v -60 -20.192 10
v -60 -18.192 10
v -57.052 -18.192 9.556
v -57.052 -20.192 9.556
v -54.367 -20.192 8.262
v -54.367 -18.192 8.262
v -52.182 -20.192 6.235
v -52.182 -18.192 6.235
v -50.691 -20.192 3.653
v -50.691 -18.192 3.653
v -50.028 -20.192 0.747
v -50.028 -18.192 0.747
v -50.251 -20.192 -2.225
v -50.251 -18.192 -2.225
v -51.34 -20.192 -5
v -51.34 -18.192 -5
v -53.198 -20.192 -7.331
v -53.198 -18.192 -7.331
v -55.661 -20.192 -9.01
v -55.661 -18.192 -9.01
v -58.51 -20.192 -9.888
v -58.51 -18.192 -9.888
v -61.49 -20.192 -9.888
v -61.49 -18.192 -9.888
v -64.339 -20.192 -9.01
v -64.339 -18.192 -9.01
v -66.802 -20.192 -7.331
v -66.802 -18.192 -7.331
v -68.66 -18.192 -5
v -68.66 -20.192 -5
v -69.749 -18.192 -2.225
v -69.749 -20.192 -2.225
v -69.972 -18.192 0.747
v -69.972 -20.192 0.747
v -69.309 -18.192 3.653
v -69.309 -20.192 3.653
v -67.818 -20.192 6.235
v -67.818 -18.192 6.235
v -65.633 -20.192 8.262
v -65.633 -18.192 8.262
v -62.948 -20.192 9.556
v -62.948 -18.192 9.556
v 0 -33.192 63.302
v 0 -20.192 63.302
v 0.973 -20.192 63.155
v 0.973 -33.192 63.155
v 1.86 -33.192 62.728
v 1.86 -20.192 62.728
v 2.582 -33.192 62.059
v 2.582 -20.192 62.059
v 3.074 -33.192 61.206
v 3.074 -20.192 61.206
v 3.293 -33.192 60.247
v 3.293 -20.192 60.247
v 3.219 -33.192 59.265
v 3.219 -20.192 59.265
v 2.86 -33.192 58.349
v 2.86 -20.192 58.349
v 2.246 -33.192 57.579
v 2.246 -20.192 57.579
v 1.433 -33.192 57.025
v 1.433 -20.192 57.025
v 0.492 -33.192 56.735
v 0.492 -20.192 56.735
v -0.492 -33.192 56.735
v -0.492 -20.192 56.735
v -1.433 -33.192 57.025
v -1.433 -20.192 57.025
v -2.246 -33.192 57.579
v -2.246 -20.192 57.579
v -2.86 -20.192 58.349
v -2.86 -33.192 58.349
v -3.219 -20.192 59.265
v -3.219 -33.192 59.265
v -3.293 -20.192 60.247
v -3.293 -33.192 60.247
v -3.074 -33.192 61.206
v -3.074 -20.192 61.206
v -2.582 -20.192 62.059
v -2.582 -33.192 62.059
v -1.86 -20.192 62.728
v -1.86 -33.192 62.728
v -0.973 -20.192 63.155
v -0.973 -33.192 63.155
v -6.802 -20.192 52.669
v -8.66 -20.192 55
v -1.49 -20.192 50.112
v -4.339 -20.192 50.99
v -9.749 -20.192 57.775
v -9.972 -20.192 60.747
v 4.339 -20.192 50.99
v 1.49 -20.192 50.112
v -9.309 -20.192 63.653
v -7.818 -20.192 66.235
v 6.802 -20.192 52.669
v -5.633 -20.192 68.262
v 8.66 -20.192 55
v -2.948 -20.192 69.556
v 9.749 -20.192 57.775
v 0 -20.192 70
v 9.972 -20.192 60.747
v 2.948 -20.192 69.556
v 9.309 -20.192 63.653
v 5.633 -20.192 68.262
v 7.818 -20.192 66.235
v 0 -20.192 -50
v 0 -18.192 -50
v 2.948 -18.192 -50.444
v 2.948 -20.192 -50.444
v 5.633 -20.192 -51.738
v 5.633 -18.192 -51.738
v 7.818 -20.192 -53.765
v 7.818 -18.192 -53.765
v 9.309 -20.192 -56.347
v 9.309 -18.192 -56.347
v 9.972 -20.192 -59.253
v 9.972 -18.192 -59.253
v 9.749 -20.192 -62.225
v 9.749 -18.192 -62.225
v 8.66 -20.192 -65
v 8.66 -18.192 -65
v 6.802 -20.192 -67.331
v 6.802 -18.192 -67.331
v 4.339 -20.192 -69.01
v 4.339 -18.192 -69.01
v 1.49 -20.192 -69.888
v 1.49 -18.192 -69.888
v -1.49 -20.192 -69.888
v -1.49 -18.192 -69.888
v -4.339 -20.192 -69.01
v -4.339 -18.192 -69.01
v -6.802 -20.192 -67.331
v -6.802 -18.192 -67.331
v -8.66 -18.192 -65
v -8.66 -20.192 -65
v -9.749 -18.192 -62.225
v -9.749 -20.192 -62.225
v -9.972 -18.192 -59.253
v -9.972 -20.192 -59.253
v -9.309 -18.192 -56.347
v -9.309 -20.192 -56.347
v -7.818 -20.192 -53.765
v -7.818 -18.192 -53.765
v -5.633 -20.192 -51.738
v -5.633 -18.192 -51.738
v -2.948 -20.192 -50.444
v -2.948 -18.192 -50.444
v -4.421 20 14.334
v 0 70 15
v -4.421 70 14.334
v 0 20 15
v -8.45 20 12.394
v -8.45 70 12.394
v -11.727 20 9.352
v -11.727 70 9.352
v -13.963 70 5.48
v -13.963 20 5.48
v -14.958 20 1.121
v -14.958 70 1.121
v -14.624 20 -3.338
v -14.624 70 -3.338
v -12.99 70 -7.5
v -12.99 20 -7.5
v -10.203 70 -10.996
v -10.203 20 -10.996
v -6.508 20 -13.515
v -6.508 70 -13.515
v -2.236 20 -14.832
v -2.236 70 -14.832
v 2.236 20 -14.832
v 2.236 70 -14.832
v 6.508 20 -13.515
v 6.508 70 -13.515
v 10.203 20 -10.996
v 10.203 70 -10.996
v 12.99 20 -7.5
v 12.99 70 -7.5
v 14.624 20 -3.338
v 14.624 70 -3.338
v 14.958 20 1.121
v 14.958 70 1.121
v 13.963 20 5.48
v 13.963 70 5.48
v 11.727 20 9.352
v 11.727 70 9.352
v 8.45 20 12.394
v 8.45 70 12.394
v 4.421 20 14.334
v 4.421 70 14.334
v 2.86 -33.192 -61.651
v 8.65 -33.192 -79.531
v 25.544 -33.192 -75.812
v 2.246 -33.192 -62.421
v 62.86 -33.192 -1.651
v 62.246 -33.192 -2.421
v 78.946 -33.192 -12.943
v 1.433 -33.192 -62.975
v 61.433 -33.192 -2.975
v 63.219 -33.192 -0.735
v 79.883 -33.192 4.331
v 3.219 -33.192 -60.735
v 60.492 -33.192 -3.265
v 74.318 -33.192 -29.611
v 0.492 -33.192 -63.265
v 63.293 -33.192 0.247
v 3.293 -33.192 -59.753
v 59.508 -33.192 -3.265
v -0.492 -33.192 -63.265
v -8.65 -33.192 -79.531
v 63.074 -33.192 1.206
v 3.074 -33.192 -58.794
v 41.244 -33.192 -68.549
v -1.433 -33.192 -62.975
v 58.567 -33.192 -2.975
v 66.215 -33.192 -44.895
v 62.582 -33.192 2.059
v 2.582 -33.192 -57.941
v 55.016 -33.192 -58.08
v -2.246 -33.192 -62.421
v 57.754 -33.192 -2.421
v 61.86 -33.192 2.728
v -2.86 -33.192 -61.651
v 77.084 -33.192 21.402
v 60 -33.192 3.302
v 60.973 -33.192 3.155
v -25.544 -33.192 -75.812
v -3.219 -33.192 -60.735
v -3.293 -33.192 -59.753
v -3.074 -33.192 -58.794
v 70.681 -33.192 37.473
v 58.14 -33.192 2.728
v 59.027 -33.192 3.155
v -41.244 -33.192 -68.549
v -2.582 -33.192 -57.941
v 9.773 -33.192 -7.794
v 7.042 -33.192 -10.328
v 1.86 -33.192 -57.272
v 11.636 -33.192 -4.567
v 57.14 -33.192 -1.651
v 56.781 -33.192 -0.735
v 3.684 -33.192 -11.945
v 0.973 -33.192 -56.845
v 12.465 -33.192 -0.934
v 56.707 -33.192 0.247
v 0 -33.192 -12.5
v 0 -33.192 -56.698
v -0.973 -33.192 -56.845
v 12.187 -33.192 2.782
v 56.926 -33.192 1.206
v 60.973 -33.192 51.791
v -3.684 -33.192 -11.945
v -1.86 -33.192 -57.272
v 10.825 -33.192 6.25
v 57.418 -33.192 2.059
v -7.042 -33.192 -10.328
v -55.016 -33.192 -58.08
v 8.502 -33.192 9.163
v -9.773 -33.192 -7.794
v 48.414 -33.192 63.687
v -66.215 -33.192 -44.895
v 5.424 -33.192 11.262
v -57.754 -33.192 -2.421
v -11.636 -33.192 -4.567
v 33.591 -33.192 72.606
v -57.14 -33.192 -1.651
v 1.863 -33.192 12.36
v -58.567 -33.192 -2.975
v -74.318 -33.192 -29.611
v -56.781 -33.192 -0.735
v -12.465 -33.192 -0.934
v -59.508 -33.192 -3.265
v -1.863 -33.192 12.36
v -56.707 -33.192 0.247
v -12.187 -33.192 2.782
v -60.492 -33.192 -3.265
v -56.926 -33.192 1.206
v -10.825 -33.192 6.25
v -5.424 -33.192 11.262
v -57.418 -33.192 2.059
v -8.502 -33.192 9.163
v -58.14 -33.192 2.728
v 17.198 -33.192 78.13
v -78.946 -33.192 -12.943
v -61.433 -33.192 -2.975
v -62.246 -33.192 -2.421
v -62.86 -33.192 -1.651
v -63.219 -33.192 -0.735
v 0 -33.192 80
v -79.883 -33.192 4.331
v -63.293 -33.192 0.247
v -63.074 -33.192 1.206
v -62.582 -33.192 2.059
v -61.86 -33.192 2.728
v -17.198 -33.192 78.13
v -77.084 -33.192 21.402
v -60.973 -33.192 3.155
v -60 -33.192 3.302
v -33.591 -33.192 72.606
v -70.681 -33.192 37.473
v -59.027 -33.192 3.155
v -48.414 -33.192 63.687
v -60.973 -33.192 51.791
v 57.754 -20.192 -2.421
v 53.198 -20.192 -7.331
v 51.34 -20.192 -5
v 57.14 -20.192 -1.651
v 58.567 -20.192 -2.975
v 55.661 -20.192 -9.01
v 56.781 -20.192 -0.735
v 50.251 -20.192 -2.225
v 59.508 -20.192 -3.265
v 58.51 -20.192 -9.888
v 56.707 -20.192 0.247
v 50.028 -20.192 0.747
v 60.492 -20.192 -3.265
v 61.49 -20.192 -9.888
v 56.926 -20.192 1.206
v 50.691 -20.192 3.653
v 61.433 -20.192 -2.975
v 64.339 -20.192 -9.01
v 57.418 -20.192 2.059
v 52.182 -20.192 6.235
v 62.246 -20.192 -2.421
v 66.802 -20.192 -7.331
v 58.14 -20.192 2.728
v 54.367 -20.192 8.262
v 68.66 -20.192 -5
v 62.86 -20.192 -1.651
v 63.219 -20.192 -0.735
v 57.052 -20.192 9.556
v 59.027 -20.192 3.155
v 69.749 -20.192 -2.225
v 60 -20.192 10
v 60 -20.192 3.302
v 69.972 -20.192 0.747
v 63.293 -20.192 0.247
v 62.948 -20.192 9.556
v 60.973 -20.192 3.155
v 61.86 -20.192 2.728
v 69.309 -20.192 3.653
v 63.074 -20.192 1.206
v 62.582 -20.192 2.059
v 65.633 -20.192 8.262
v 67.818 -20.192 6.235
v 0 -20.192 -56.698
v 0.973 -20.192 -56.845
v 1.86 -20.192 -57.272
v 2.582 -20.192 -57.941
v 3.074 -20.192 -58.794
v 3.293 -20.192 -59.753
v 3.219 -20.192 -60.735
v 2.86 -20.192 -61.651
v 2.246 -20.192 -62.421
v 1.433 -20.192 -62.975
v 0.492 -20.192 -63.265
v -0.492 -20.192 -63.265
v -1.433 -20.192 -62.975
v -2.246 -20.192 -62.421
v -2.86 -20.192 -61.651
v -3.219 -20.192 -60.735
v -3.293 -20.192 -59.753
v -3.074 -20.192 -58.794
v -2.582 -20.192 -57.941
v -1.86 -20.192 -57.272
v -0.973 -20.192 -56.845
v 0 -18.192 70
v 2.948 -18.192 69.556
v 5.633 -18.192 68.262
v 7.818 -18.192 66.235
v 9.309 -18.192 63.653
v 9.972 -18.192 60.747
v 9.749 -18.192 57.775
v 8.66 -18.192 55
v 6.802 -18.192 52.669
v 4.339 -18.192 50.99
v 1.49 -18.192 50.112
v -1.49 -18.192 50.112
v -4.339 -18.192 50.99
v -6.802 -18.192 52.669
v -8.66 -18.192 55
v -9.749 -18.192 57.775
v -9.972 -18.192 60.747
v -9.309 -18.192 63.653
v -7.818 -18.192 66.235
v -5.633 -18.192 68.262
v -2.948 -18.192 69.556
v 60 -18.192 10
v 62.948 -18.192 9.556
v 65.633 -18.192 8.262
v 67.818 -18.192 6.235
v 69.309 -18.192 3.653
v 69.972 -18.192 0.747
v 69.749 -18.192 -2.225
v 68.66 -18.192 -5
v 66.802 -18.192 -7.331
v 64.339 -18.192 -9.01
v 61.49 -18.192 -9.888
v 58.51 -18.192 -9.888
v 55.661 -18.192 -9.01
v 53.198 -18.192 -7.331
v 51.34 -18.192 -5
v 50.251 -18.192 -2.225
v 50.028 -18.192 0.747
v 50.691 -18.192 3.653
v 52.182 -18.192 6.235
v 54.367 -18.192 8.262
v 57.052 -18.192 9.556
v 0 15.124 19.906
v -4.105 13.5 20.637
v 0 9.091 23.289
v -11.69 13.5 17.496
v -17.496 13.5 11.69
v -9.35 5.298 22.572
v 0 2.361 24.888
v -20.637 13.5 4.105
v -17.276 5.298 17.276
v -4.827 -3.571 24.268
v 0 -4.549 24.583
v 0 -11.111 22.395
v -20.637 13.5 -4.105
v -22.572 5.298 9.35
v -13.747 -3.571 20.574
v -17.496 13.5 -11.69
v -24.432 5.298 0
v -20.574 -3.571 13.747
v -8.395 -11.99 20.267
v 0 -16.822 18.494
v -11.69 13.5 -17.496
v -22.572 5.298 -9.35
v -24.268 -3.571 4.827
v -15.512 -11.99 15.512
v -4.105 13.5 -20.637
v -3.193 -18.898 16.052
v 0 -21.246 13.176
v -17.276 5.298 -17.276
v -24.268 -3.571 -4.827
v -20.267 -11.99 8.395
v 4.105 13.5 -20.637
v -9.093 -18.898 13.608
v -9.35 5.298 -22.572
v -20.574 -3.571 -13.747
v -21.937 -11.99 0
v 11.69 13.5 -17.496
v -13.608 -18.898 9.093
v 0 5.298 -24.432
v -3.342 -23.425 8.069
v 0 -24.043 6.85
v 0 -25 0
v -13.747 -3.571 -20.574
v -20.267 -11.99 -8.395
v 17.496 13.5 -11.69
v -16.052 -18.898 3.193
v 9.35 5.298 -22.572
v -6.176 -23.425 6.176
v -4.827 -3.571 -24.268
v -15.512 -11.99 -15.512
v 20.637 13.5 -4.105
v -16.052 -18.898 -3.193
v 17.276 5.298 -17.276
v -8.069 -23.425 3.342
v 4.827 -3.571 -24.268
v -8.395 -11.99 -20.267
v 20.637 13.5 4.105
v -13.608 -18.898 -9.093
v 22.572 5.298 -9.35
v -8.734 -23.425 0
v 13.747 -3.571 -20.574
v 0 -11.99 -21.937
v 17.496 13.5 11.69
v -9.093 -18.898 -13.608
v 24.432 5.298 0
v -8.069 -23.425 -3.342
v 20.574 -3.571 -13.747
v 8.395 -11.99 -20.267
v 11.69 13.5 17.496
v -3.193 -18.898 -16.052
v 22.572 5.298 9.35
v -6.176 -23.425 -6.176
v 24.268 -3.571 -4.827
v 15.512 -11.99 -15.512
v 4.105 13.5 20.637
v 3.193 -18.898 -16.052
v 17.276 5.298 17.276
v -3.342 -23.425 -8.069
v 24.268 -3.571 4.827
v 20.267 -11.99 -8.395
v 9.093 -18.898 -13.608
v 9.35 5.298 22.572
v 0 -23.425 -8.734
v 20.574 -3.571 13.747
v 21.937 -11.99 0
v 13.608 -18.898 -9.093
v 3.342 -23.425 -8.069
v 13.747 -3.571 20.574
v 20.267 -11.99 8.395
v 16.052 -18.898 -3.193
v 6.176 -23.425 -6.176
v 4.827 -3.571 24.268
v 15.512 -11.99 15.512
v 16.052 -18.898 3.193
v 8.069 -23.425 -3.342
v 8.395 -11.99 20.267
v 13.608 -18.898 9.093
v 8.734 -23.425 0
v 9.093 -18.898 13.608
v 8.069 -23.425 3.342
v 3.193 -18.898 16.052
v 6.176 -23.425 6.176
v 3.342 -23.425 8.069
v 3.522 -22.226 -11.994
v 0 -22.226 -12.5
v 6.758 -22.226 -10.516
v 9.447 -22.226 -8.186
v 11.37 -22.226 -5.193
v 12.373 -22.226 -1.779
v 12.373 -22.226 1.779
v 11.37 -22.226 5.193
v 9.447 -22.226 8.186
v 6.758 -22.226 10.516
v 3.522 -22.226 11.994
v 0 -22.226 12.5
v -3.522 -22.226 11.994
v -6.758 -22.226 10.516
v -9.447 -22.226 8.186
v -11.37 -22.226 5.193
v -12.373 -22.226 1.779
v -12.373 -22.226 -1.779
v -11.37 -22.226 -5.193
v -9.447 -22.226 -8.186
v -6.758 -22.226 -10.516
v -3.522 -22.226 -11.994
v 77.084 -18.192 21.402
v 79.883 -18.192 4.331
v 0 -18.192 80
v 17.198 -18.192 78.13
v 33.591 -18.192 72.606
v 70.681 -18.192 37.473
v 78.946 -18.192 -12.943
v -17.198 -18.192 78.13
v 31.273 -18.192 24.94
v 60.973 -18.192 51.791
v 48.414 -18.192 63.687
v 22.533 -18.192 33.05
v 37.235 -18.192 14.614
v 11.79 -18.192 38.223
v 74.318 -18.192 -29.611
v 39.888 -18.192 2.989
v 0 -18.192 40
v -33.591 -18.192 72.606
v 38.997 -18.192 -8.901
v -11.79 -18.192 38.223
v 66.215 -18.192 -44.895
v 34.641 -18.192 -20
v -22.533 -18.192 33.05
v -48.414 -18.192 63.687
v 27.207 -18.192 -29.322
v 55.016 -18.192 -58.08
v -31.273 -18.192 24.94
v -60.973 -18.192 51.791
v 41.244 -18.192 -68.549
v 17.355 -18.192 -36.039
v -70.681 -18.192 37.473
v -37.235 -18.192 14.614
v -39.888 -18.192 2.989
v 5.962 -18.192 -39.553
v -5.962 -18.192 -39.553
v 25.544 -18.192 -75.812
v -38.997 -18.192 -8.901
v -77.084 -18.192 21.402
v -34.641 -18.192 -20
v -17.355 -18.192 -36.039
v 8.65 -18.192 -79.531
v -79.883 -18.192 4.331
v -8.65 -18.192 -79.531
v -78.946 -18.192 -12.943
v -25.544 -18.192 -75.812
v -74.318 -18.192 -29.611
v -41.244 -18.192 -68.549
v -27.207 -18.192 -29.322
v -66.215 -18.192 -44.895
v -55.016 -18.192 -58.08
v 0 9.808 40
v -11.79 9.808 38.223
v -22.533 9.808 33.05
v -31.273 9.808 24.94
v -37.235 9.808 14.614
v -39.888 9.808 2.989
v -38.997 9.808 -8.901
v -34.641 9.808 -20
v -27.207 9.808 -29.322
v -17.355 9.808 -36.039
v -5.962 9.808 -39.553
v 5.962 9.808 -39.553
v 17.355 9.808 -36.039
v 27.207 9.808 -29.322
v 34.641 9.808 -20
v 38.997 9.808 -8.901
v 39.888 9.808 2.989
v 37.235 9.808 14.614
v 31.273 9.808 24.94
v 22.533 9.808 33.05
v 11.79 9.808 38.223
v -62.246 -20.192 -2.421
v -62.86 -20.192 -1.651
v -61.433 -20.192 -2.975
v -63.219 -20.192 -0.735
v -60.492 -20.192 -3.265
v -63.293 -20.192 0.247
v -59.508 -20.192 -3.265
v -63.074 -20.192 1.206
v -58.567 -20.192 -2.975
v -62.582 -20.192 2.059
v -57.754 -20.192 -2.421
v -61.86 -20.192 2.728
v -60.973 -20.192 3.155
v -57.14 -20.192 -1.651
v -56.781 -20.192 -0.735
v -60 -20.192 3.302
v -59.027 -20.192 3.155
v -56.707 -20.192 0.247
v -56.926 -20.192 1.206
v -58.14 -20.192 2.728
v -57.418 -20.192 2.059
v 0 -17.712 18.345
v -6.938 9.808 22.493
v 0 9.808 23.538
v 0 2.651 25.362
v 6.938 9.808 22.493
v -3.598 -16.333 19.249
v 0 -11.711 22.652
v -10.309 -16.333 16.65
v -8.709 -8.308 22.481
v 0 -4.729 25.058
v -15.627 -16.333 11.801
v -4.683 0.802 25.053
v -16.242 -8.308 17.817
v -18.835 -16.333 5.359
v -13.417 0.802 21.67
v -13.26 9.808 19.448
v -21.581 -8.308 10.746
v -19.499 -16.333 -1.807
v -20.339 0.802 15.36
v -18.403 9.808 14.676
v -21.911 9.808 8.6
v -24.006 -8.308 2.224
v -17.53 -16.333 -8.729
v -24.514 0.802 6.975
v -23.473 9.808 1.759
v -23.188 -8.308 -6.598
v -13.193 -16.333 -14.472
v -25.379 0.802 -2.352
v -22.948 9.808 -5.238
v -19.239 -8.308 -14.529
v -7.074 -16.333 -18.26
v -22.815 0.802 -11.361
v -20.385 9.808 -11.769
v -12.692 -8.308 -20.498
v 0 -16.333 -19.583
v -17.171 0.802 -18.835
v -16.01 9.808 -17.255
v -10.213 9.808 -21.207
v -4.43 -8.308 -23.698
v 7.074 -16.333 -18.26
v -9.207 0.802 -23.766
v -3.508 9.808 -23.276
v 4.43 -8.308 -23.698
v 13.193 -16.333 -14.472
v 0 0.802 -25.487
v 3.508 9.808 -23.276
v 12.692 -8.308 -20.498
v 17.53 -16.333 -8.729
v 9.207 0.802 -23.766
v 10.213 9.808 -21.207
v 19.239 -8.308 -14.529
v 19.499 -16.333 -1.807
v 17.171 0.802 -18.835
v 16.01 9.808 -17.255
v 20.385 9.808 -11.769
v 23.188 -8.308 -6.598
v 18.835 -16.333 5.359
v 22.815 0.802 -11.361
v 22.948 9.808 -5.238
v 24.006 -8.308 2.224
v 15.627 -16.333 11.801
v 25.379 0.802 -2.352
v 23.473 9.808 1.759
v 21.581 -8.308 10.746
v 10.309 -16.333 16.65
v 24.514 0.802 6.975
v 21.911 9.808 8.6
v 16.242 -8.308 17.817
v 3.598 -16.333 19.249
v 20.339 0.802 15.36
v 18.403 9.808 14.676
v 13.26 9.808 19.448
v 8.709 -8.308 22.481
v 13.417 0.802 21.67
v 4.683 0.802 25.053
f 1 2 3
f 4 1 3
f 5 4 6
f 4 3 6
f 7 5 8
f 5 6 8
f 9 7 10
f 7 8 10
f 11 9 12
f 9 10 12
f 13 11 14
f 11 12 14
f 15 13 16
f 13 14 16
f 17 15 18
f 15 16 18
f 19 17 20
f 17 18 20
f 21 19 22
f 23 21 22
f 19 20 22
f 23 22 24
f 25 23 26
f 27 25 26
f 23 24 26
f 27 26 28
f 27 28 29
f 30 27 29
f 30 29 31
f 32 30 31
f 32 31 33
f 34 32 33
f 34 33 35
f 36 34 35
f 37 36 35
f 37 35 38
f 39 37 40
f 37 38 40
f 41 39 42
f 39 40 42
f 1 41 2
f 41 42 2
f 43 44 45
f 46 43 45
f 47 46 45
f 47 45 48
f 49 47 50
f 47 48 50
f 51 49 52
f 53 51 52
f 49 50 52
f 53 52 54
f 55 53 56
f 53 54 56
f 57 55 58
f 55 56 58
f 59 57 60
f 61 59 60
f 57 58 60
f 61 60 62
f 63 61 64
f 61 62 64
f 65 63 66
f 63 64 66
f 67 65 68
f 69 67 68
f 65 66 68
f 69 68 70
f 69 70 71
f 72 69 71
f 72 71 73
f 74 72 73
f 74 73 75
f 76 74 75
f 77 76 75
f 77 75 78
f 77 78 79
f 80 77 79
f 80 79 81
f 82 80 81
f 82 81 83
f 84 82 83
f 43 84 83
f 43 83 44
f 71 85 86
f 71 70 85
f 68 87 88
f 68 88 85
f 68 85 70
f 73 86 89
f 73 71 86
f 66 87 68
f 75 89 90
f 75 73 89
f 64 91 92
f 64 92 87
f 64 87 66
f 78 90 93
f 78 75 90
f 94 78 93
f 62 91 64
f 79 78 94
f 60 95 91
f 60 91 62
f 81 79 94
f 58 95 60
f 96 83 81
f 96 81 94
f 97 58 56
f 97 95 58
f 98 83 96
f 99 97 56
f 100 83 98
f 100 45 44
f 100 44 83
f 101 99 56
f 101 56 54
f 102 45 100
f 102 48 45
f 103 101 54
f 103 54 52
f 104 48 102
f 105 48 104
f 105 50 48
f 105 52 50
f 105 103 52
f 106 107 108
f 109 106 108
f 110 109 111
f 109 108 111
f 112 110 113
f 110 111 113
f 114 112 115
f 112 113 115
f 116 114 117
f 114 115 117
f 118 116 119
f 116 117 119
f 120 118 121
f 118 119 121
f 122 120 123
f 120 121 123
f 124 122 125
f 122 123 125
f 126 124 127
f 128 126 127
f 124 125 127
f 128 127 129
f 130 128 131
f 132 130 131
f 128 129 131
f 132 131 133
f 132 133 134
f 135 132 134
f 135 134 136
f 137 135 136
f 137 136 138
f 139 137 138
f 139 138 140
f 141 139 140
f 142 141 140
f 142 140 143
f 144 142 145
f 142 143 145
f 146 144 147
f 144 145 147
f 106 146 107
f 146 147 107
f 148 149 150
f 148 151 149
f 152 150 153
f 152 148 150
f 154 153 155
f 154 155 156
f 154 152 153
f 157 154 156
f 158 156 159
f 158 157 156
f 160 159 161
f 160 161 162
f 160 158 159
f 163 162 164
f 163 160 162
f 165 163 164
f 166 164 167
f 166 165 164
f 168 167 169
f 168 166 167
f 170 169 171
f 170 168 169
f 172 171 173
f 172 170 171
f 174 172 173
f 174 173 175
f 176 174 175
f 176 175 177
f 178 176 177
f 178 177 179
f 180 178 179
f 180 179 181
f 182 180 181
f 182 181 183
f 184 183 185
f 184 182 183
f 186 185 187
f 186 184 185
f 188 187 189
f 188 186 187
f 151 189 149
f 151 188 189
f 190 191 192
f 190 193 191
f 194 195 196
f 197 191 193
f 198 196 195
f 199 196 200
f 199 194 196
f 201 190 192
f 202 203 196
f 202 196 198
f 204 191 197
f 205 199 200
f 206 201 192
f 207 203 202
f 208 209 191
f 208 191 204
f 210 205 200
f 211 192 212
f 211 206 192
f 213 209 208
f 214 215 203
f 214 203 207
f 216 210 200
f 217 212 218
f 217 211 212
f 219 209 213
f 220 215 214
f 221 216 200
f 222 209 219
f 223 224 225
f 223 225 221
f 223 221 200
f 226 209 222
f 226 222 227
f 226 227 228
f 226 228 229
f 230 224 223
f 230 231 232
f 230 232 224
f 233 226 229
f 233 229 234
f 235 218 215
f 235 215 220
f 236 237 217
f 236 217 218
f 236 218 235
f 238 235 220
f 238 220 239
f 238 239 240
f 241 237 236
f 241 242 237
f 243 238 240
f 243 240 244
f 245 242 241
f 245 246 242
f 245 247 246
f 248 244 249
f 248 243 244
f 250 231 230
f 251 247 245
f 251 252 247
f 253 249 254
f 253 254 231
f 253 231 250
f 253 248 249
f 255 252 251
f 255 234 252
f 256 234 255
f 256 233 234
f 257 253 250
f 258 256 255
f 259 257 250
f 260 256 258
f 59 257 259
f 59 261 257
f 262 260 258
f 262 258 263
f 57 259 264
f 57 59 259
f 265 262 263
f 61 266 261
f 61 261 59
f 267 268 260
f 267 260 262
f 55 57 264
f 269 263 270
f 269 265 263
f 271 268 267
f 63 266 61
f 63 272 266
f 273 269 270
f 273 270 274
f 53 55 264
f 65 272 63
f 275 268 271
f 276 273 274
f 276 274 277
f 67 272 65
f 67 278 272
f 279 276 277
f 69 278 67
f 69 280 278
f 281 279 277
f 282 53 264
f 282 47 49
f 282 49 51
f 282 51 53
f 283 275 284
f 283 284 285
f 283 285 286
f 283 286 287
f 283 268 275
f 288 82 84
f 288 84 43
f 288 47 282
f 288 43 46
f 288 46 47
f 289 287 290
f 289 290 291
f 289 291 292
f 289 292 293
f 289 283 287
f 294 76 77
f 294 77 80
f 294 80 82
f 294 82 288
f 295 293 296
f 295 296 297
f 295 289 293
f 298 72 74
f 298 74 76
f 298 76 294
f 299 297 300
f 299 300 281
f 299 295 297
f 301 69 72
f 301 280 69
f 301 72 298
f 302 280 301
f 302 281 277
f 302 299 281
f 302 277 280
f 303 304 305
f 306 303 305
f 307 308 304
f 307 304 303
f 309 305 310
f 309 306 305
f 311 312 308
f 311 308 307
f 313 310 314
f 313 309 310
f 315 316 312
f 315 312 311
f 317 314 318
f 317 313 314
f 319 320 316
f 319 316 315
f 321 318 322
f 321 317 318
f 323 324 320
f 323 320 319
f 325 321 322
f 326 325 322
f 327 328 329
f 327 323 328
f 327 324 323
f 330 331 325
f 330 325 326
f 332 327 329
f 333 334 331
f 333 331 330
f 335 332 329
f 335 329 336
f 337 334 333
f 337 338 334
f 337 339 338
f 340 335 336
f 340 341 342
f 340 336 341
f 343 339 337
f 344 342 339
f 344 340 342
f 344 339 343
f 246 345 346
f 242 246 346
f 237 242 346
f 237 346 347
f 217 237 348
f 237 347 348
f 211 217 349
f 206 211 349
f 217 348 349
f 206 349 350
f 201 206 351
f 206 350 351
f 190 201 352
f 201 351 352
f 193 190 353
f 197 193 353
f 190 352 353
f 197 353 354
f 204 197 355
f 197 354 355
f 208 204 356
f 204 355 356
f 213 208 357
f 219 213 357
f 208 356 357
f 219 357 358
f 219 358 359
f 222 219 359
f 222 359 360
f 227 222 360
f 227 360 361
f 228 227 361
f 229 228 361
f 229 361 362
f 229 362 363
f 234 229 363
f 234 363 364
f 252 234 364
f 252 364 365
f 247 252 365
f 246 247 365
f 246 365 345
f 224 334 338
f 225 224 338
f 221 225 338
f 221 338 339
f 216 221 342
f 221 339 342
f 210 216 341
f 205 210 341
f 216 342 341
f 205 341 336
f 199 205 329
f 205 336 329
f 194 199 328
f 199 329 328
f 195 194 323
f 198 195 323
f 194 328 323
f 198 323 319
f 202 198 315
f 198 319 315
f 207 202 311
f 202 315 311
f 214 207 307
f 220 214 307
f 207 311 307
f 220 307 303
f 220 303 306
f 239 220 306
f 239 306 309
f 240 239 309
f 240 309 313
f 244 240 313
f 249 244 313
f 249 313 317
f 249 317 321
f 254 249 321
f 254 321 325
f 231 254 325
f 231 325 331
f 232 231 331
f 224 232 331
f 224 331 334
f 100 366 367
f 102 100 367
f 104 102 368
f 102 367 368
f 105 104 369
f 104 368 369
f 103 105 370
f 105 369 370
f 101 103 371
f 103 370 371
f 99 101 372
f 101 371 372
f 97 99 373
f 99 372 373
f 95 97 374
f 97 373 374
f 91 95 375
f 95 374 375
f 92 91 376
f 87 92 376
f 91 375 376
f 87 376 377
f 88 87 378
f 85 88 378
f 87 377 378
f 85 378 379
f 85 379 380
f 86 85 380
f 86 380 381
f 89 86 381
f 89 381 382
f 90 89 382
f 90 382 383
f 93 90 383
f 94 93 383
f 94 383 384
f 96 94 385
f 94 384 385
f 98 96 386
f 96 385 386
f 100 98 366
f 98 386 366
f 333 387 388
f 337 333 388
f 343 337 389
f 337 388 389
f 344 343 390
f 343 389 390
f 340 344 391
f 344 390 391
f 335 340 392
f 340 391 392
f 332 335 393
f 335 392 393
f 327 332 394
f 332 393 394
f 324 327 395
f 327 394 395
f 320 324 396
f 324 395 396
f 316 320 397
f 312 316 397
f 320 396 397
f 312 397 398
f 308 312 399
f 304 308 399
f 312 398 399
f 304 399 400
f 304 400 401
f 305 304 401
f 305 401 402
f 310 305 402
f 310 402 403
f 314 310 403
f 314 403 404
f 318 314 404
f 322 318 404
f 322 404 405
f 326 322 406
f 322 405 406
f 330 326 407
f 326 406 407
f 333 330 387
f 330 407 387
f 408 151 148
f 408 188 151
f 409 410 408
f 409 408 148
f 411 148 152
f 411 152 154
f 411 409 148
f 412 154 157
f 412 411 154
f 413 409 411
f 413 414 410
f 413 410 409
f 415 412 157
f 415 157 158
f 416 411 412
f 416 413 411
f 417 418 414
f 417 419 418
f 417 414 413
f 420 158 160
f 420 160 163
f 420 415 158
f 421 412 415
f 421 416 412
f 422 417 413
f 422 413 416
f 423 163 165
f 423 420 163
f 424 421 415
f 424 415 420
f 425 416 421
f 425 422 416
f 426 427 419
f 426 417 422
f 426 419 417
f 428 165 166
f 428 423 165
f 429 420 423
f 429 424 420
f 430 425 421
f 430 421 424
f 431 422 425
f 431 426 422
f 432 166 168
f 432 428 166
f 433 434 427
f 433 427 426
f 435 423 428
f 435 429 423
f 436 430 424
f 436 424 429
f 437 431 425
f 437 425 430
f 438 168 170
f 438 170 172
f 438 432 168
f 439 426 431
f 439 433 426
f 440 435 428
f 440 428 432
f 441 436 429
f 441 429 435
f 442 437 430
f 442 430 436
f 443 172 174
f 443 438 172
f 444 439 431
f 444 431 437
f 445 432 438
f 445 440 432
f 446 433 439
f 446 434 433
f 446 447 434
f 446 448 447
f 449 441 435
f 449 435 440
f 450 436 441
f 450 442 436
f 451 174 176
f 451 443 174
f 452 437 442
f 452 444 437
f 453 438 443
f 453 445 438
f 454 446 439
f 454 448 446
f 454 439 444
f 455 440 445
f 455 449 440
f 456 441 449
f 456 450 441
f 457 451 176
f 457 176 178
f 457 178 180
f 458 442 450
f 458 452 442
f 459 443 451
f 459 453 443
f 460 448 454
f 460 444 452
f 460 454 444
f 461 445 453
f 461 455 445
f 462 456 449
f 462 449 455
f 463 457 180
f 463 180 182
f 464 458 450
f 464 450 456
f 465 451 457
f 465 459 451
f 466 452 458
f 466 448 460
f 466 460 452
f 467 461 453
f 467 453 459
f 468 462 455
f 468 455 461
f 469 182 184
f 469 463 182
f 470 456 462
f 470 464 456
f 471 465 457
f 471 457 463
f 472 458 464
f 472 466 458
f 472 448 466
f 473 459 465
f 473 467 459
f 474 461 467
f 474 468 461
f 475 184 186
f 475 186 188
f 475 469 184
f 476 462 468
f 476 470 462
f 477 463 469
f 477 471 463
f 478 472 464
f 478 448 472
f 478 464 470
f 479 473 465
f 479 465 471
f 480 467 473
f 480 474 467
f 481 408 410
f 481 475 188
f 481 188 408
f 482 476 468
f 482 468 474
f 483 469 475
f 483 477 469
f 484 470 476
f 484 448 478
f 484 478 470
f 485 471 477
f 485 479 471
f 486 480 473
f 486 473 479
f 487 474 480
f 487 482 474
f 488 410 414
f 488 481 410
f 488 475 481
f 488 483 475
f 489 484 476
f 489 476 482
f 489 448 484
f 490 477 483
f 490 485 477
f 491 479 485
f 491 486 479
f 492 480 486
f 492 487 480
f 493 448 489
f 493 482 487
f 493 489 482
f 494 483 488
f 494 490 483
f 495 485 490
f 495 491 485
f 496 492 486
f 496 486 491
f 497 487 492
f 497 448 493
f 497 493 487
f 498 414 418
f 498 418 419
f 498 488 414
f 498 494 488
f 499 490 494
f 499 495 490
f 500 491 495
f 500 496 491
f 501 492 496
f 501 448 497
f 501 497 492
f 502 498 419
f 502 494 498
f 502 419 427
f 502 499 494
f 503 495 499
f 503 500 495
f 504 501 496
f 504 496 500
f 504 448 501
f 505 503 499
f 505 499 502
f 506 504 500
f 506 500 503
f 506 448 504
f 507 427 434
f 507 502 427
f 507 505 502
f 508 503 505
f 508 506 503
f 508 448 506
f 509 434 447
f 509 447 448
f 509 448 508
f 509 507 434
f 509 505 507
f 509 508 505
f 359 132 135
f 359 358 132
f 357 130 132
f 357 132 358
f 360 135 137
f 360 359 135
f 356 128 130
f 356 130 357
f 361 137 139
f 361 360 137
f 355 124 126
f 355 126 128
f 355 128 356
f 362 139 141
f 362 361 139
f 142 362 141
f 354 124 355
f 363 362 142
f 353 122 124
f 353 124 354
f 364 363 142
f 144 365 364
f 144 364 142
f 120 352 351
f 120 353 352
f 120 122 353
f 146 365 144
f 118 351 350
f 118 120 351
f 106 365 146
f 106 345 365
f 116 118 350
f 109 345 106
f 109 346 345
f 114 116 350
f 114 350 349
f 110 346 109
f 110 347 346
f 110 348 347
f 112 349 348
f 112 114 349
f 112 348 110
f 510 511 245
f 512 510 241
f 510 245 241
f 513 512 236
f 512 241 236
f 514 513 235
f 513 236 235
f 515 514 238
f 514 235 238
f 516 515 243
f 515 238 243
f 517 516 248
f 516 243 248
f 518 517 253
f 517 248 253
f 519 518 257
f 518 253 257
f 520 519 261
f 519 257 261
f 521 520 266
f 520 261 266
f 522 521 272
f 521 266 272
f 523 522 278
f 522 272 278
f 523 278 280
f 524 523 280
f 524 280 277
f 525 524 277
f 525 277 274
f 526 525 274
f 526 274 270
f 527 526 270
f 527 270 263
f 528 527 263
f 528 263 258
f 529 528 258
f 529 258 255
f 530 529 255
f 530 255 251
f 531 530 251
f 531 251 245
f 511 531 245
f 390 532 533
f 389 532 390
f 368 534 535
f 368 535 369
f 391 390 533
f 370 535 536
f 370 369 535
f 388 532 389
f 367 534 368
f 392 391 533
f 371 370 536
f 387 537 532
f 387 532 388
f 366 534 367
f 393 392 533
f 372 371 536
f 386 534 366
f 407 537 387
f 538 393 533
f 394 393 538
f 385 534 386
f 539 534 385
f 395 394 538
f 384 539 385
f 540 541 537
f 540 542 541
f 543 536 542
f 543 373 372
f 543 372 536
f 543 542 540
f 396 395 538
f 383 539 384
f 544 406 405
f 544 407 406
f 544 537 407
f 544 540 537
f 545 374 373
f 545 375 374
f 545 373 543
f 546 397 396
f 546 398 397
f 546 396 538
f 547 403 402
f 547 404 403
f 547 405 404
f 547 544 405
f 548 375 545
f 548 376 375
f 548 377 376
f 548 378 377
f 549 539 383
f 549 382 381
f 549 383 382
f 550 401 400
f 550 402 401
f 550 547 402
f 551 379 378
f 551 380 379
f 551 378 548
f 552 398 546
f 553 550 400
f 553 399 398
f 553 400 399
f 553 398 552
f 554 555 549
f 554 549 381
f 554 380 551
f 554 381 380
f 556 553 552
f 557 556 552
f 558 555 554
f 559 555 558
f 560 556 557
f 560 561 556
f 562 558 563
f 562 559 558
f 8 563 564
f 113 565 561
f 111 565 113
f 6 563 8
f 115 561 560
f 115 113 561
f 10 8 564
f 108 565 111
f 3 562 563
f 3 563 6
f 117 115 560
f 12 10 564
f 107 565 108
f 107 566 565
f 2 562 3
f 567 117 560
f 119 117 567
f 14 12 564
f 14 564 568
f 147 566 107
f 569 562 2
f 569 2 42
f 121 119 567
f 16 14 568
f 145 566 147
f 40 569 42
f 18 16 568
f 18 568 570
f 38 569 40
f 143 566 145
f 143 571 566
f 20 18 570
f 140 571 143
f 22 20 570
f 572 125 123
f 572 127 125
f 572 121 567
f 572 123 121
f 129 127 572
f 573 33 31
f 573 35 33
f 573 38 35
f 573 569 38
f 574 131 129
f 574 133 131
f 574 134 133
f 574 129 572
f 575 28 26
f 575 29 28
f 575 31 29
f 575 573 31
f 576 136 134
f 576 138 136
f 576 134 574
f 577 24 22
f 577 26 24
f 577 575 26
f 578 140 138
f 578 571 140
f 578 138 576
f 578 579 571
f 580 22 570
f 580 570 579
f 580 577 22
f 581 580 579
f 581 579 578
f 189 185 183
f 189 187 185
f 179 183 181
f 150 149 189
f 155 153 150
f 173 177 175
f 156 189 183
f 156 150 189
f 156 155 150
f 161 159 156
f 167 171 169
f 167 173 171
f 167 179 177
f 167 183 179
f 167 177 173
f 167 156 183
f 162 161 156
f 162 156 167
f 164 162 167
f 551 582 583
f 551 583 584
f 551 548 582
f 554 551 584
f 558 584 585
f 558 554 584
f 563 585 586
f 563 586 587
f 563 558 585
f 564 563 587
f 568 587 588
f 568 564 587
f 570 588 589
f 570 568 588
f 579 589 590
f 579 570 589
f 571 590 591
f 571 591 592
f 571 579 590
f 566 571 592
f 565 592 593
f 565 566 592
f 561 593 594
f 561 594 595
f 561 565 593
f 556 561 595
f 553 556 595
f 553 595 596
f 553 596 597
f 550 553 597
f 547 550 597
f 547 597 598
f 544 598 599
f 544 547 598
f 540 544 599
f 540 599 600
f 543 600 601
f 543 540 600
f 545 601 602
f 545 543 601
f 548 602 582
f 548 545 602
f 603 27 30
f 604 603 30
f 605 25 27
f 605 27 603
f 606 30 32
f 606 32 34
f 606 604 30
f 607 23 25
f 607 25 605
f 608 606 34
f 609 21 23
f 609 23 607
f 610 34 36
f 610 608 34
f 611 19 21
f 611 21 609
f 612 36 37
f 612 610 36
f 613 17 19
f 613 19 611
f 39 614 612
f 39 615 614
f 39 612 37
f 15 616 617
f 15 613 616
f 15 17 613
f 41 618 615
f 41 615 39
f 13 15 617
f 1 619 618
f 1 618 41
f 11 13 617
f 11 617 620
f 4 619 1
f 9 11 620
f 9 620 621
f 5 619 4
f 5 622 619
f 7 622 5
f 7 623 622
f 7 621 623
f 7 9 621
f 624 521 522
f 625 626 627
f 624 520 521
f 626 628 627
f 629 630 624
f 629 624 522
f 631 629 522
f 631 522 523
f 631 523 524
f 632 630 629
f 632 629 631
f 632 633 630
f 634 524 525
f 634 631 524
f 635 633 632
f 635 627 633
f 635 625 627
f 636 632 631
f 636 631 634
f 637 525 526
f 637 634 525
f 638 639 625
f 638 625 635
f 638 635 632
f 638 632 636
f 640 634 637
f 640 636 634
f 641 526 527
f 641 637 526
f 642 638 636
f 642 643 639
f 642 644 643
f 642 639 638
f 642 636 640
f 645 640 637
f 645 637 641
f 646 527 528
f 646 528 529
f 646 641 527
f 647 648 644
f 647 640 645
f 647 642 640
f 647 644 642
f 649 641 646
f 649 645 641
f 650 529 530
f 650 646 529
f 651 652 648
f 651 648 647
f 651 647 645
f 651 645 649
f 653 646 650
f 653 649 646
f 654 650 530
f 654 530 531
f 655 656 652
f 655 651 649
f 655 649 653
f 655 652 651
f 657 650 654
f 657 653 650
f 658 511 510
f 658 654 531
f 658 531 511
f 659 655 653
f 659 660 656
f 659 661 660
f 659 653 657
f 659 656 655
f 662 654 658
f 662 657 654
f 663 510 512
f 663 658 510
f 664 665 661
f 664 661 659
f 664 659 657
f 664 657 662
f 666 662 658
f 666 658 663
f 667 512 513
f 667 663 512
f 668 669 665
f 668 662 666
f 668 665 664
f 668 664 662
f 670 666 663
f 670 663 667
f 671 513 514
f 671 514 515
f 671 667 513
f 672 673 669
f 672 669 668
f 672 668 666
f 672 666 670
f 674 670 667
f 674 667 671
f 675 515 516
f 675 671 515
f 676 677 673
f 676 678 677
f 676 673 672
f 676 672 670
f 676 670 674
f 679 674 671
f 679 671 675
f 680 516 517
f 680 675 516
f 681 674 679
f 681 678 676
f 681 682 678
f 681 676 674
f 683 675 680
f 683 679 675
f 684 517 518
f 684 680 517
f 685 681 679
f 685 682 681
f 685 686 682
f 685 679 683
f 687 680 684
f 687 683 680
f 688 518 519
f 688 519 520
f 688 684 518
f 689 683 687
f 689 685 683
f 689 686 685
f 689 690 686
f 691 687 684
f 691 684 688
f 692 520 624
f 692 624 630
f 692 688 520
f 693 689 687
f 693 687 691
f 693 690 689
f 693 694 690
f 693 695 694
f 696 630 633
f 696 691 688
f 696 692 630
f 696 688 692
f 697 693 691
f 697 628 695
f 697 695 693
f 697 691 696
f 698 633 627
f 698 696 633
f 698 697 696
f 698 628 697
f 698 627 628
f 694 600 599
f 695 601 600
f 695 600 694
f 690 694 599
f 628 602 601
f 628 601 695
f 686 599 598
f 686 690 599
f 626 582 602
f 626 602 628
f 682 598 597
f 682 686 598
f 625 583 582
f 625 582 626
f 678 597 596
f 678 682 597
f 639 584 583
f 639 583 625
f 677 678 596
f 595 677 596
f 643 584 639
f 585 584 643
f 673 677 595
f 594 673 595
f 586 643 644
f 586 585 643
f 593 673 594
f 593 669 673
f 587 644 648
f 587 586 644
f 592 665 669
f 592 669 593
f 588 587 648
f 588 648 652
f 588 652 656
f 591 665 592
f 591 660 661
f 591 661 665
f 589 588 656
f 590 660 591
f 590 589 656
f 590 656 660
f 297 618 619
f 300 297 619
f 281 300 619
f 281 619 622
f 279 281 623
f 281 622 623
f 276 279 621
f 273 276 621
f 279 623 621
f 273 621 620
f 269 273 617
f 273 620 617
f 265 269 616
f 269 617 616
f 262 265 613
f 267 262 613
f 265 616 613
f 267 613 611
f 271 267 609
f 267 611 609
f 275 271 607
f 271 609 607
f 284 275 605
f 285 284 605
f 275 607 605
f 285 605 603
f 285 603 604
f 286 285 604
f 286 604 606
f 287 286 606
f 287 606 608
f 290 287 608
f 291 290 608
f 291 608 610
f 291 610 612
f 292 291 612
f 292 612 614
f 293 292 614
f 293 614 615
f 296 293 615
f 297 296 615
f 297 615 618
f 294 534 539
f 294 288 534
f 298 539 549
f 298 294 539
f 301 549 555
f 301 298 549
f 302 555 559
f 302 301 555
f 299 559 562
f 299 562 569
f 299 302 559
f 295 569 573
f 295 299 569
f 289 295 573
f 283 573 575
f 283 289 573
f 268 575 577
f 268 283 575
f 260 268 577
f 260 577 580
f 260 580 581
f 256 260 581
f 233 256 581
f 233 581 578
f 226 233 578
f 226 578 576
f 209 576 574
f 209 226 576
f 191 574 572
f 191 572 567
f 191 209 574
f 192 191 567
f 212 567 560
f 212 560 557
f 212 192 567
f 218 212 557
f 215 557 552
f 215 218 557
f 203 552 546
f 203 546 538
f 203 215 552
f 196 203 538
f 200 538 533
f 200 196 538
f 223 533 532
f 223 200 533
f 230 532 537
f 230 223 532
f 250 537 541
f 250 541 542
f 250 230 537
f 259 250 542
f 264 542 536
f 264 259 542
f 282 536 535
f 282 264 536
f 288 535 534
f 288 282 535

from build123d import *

# Parameters (mm, degrees)
SKETCH2_R               = 10
CUT_EXTRUDE1_DEPTH      = 2
SKETCH3_R               = 3.302
CUT_EXTRUDE2_DEPTH      = 144.449932506
CUT_EXTRUDE3_REACH      = 155.13
CUT_EXTRUDE3_END_RADIUS = 25.5
SKETCH4_R               = 12.5


with BuildPart() as part:
    # Sketch1 → Revolve2 (revolve)
    with BuildSketch(Plane.XY, mode=Mode.PRIVATE) as revolve2_sk:
        with BuildLine():
            Line((0, 70), (15, 70))
            Line((15, 70), (15, 20))
            ThreePointArc((15, 20), (23.717082451, -7.90569415), (0, -25))
            Line((0, -25), (0, 70))
        make_face()
        with BuildLine():
            Line((23.538461538, 9.807692308), (40, 9.807692308))
            Line((40, 9.807692308), (40, -18.192307692))
            Line((40, -18.192307692), (80, -18.192307692))
            Line((80, -18.192307692), (80, -33.192307692))
            Line((80, -33.192307692), (0, -33.192307692))
            Line((0, -33.192307692), (0, -25.5))
            ThreePointArc((0, -25.5), (21.217282506, -14.144855004), (23.538461538, 9.807692308))
        make_face()
    revolve(revolve2_sk.sketch.rotate(Axis((0, 0, 0), (0, -1, 0)), 90), axis=Axis((0, 0, 0), (0, -1, 0)))

    # Sketch2 → Cut-Extrude1 (cut)
    with BuildSketch(Plane(origin=(0, -18.192307692, 0), x_dir=(1, 0, 0), z_dir=(0, 1, 0))):
        with Locations(Location((0, 60, 0), (0, 0, 270))):
            Circle(SKETCH2_R)
        with Locations(Location((60, 0, 0), (0, 0, 270))):
            Circle(SKETCH2_R)
        with Locations(Location((0, -60, 0), (0, 0, 270))):
            Circle(SKETCH2_R)
        with Locations(Location((-60, 0, 0), (0, 0, 270))):
            Circle(SKETCH2_R)
    extrude(amount=-CUT_EXTRUDE1_DEPTH, mode=Mode.SUBTRACT)

    # Sketch3 → Cut-Extrude2 (cut, through all)
    with BuildSketch(Plane(origin=(0, -18.192307692, 0), x_dir=(1, 0, 0), z_dir=(0, 1, 0))):
        with Locations(Location((0, 60, 0), (0, 0, 270))):
            Circle(SKETCH3_R)
        with Locations(Location((60, 0, 0), (0, 0, 270))):
            Circle(SKETCH3_R)
        with Locations(Location((0, -60, 0), (0, 0, 270))):
            Circle(SKETCH3_R)
        with Locations(Location((-60, 0, 0), (0, 0, 270))):
            Circle(SKETCH3_R)
    extrude(amount=-CUT_EXTRUDE2_DEPTH, mode=Mode.SUBTRACT)

    # Cut-Extrude3: up to this sphere (the profile starts outside it)
    cut_extrude3_end = Location((0, 0, 0)) * Sphere(CUT_EXTRUDE3_END_RADIUS, mode=Mode.PRIVATE)
    # Sketch4 → Cut-Extrude3 (cut, up to the surface)
    with BuildSketch(Plane.XZ.offset(33.192307692), mode=Mode.PRIVATE) as cut_extrude3_sk1:
        with Locations(Location((0, 0, 0), (0, 0, 270))):
            Circle(SKETCH4_R)
    cut_extrude3_tool1 = extrude(cut_extrude3_sk1.sketch, amount=-CUT_EXTRUDE3_REACH, mode=Mode.PRIVATE) - cut_extrude3_end
    add(cut_extrude3_tool1.solids().sort_by_distance((0, -33.192308, 0))[0], mode=Mode.SUBTRACT)


solid = part.part
